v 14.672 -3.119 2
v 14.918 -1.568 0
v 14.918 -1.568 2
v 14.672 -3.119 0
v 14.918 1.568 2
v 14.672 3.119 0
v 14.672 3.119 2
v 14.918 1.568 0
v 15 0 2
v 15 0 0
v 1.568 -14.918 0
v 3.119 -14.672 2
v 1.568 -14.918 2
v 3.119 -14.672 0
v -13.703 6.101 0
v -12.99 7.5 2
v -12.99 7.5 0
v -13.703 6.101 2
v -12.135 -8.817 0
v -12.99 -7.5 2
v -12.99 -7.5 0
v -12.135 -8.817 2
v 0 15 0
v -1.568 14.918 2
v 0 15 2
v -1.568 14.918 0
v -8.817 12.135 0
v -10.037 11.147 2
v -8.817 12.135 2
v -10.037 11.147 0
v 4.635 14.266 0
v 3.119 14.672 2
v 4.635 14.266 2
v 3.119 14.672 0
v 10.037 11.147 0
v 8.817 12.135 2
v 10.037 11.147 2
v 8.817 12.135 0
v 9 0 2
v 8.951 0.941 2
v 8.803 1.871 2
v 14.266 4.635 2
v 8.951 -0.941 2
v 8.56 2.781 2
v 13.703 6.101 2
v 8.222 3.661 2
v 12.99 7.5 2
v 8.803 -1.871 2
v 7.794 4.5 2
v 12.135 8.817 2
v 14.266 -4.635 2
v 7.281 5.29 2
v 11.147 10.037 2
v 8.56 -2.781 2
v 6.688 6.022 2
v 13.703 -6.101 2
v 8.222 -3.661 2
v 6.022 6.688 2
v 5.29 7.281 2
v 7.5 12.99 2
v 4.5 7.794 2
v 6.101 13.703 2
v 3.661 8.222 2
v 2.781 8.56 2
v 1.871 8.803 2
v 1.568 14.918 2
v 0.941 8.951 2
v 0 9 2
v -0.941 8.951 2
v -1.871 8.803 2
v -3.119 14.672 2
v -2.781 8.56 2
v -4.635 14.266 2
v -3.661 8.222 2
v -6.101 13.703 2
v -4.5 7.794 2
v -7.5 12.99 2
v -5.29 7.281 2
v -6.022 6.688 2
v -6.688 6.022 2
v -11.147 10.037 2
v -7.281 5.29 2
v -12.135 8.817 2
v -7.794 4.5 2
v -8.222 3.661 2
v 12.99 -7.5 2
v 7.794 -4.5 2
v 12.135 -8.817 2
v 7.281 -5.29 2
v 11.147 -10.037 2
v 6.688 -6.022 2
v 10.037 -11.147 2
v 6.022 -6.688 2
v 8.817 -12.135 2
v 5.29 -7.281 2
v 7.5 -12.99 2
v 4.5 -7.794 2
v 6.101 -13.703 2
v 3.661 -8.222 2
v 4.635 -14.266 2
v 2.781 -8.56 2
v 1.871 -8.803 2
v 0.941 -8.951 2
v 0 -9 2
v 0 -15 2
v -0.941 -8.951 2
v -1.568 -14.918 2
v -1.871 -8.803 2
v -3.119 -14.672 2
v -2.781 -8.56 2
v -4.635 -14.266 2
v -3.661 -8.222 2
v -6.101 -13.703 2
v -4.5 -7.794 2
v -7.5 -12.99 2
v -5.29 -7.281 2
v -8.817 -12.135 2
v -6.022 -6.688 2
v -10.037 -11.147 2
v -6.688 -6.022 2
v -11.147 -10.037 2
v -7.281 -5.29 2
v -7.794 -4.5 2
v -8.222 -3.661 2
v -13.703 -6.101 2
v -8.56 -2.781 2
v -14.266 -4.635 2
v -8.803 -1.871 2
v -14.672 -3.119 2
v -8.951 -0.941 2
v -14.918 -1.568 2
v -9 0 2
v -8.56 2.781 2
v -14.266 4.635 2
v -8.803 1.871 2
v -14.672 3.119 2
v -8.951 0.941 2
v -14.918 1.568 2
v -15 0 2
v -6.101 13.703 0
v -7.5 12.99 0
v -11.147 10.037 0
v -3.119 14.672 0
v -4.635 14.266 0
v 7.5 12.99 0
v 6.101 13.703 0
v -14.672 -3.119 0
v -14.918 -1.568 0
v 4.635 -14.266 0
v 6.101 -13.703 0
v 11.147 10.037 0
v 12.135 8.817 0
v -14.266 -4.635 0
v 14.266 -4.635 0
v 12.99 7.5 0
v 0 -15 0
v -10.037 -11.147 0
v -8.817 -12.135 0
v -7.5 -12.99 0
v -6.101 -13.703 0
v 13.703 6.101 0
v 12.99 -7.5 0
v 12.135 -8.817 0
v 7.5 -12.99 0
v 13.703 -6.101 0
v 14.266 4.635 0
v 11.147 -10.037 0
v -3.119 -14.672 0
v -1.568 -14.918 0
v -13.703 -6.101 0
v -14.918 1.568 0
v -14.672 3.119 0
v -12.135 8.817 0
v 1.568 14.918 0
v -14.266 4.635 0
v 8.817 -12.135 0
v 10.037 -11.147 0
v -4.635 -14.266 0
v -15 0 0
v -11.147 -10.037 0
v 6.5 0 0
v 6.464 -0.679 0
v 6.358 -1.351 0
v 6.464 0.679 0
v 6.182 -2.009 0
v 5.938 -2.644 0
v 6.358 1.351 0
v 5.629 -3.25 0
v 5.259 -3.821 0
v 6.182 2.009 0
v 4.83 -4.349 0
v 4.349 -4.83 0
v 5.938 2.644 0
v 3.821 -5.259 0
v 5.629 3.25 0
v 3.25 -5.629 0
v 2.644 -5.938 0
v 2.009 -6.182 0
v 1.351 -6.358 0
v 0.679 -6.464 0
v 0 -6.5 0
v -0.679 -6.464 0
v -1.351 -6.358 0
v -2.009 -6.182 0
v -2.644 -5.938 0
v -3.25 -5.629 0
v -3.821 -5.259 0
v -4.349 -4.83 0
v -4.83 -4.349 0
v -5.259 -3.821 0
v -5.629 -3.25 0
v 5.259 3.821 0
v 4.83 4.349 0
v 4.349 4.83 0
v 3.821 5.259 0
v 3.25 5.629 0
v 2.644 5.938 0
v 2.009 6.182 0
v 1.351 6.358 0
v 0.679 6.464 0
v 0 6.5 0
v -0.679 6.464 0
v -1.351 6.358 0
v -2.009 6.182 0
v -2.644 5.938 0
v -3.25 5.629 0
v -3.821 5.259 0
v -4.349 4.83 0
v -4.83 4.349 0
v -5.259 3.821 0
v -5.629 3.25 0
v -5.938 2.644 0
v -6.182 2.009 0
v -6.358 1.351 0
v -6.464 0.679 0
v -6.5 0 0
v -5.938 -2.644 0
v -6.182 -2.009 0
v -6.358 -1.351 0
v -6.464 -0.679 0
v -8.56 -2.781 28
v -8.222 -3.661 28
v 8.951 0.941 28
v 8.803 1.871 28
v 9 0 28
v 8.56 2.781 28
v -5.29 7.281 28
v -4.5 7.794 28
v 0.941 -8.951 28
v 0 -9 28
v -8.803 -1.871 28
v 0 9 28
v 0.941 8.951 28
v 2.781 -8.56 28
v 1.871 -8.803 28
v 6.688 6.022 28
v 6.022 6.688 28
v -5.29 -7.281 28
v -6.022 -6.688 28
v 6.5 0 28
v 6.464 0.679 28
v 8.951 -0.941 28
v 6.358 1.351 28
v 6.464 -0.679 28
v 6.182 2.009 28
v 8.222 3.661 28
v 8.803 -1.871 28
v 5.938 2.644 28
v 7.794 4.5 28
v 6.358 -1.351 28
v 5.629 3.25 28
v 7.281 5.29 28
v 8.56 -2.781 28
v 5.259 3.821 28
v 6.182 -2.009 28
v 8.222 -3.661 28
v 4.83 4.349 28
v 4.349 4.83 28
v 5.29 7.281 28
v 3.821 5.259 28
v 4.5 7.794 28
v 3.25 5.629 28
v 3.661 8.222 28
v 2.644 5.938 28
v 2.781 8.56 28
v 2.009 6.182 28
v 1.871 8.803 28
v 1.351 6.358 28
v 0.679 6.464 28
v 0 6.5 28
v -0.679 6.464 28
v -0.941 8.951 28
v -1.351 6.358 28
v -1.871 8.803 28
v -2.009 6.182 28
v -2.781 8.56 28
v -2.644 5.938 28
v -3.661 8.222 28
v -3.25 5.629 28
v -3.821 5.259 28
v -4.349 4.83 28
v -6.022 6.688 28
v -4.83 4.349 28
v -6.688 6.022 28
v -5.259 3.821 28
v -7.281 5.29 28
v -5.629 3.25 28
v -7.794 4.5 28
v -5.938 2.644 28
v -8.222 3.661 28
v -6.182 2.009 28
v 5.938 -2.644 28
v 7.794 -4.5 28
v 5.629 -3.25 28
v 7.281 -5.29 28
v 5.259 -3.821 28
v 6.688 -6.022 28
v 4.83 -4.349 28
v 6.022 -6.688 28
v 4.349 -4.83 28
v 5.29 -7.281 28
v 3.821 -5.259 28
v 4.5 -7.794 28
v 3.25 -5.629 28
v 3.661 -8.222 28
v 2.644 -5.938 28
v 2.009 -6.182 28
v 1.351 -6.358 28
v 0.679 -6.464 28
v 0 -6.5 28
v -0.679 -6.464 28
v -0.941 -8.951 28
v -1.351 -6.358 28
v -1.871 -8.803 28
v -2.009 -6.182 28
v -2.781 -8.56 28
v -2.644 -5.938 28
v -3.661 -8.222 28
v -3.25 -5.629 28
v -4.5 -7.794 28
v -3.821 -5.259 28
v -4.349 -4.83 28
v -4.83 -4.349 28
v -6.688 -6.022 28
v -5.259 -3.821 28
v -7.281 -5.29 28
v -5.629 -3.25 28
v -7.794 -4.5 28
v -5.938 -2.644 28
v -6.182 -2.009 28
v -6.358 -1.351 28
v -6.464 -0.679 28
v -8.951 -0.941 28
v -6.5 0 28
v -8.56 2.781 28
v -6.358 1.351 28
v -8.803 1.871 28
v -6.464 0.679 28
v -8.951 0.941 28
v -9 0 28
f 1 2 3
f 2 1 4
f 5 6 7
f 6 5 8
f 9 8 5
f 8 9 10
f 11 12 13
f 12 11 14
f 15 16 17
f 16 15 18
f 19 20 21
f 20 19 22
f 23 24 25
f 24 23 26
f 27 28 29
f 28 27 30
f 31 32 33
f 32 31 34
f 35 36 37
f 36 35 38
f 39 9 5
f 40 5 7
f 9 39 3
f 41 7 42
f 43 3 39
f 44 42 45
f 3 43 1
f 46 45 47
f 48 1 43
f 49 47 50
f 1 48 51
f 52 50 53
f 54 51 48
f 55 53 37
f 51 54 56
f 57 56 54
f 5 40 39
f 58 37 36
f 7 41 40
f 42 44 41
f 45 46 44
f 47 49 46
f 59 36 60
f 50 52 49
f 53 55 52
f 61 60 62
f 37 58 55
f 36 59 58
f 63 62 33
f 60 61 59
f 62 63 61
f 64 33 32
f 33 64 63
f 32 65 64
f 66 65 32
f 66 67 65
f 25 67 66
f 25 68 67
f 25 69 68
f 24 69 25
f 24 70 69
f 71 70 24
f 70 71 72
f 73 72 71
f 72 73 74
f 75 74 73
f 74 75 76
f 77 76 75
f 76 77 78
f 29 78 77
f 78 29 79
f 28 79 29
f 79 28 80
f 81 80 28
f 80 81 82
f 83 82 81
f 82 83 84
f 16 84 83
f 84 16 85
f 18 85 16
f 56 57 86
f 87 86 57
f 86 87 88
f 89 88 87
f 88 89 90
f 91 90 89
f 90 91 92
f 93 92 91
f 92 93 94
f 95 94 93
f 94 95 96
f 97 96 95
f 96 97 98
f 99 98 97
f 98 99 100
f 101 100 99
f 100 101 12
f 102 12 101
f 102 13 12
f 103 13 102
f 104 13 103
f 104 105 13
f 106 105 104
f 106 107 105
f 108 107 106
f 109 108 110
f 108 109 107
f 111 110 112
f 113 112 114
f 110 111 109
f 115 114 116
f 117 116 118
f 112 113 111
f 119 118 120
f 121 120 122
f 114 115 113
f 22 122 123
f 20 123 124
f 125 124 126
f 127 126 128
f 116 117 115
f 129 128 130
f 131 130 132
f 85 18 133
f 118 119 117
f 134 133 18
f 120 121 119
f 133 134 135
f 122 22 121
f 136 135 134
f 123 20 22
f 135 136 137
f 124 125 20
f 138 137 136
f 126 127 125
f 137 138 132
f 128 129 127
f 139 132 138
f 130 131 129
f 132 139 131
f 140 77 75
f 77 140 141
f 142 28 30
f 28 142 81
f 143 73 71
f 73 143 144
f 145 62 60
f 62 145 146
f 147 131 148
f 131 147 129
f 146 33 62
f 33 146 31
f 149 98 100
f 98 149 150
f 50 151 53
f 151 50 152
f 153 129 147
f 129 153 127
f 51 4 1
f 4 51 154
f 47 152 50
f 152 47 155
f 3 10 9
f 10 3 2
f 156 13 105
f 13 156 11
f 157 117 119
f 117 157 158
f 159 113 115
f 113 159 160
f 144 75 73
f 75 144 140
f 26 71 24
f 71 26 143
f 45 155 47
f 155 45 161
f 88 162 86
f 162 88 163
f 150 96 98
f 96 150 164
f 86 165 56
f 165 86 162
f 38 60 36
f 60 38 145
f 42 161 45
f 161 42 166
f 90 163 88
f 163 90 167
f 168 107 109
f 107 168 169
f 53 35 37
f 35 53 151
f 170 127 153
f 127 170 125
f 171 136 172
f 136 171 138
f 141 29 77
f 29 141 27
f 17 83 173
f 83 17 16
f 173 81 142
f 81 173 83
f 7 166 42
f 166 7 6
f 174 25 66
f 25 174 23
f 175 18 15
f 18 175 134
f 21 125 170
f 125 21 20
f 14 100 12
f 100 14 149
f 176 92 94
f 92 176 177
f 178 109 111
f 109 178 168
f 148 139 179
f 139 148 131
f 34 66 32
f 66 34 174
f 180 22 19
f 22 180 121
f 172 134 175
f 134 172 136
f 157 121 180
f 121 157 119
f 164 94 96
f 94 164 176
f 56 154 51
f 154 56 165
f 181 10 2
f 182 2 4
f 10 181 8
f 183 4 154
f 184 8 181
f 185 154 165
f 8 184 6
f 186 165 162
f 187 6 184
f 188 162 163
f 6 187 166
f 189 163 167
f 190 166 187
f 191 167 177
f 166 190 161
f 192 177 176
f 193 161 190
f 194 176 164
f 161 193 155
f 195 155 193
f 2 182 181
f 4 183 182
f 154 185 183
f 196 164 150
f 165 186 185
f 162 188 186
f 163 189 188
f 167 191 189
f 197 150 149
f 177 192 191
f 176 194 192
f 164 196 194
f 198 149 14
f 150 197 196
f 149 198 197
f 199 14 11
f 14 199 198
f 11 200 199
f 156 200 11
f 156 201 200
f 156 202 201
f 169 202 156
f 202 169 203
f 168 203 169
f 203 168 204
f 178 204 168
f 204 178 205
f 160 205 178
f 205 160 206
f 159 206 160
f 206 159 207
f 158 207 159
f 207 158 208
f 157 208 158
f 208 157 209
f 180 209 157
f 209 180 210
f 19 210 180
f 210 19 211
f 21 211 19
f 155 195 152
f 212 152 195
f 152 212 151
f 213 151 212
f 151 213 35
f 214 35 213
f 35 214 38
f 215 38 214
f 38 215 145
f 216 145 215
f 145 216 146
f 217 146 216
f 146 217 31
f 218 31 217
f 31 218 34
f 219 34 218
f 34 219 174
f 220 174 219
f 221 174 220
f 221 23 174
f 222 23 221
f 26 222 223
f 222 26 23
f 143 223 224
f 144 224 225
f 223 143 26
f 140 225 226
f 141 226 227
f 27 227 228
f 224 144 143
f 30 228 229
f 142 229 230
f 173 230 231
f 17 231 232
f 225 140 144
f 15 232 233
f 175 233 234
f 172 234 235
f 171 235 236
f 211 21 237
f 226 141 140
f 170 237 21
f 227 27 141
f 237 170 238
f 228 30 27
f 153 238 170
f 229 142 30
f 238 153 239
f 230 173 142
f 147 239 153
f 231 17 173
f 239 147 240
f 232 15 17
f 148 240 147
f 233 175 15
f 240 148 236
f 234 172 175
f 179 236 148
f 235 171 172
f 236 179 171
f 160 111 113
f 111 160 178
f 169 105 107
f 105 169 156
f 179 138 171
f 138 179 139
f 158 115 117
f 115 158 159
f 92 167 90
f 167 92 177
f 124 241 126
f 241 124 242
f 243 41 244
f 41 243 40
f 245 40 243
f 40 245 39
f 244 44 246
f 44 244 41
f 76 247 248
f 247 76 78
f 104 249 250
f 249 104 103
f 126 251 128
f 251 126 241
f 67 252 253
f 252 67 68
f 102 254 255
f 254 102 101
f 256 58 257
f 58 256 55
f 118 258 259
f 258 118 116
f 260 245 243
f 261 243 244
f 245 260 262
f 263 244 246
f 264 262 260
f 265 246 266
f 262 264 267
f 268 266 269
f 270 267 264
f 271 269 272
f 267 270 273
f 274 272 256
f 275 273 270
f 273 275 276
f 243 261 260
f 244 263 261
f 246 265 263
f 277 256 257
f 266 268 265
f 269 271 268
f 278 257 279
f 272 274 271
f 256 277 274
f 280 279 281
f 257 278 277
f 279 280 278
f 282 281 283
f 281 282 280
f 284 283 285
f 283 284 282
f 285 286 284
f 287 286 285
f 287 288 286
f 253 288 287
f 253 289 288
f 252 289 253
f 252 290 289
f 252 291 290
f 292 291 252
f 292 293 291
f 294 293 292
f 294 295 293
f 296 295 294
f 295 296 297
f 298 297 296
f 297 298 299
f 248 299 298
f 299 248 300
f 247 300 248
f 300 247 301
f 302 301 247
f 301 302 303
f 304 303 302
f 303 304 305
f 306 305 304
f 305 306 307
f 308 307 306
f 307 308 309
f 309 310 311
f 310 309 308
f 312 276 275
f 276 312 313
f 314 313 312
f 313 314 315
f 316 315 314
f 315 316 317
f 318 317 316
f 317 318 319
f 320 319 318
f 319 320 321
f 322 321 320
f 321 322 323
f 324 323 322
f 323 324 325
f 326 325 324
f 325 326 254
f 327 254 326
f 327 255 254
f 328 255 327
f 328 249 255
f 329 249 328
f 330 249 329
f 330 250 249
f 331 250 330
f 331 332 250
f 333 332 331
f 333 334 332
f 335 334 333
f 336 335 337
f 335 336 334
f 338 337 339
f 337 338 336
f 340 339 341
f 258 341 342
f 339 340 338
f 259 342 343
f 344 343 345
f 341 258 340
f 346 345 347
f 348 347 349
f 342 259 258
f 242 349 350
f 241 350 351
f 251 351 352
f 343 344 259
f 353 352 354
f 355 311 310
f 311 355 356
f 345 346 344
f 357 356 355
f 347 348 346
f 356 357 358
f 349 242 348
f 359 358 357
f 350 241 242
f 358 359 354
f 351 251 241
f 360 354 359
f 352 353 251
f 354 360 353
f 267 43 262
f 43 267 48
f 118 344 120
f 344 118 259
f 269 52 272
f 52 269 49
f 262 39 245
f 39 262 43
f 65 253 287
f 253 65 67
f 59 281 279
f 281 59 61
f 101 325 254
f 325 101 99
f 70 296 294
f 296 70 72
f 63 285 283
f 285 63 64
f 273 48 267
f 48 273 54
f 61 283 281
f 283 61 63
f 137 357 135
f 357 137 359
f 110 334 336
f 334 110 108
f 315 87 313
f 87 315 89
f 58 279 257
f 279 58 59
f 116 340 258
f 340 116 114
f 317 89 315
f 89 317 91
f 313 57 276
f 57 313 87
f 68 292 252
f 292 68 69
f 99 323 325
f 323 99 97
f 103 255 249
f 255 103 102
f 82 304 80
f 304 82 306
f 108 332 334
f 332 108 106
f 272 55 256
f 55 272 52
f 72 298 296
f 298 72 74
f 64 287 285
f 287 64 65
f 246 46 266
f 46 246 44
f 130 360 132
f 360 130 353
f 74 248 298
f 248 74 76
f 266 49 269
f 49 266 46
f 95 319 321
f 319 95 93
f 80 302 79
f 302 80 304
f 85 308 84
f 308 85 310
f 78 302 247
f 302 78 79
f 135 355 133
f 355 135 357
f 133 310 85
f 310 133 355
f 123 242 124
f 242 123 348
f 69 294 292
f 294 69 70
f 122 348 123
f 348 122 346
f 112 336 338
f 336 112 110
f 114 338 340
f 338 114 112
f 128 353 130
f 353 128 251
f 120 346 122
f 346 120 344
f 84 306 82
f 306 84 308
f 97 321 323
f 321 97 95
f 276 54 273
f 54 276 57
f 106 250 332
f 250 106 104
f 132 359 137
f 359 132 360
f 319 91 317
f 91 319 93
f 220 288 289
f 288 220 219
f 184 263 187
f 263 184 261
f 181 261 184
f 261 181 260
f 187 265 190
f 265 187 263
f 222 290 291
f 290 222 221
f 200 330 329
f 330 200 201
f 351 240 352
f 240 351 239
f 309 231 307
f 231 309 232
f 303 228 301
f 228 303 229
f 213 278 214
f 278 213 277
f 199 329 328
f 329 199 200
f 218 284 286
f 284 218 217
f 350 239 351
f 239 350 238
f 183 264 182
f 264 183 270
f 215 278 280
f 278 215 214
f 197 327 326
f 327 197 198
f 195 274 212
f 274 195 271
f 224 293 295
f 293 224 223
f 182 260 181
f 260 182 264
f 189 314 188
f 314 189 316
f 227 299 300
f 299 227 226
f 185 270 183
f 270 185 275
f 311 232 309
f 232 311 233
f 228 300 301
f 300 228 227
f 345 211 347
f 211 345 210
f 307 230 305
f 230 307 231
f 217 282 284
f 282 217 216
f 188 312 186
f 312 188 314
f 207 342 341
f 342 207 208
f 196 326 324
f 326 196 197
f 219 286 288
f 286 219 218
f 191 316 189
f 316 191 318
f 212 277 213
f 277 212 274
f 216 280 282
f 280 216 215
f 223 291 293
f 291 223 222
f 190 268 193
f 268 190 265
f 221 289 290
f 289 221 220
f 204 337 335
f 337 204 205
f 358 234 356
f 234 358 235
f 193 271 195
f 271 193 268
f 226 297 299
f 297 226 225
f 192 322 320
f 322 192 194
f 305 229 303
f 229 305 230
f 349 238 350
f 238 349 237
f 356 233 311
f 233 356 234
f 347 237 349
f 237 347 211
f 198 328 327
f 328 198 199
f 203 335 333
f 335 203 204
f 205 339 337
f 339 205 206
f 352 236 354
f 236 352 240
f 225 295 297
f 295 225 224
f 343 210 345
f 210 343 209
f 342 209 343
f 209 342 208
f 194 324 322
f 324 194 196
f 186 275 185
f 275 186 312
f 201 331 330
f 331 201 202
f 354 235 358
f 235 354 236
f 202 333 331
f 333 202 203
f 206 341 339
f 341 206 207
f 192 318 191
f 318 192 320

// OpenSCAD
// Wall-mount standoff with screw flange.
$fn = 60;
eps = 0.02;
thread_d = 13;
base_d = 30;
length = 28;
difference() { union() { cylinder(d=base_d,h=2); cylinder(d=thread_d+5,h=length); } translate([0,0,-eps]) cylinder(d=thread_d,h=length+2*eps); }
